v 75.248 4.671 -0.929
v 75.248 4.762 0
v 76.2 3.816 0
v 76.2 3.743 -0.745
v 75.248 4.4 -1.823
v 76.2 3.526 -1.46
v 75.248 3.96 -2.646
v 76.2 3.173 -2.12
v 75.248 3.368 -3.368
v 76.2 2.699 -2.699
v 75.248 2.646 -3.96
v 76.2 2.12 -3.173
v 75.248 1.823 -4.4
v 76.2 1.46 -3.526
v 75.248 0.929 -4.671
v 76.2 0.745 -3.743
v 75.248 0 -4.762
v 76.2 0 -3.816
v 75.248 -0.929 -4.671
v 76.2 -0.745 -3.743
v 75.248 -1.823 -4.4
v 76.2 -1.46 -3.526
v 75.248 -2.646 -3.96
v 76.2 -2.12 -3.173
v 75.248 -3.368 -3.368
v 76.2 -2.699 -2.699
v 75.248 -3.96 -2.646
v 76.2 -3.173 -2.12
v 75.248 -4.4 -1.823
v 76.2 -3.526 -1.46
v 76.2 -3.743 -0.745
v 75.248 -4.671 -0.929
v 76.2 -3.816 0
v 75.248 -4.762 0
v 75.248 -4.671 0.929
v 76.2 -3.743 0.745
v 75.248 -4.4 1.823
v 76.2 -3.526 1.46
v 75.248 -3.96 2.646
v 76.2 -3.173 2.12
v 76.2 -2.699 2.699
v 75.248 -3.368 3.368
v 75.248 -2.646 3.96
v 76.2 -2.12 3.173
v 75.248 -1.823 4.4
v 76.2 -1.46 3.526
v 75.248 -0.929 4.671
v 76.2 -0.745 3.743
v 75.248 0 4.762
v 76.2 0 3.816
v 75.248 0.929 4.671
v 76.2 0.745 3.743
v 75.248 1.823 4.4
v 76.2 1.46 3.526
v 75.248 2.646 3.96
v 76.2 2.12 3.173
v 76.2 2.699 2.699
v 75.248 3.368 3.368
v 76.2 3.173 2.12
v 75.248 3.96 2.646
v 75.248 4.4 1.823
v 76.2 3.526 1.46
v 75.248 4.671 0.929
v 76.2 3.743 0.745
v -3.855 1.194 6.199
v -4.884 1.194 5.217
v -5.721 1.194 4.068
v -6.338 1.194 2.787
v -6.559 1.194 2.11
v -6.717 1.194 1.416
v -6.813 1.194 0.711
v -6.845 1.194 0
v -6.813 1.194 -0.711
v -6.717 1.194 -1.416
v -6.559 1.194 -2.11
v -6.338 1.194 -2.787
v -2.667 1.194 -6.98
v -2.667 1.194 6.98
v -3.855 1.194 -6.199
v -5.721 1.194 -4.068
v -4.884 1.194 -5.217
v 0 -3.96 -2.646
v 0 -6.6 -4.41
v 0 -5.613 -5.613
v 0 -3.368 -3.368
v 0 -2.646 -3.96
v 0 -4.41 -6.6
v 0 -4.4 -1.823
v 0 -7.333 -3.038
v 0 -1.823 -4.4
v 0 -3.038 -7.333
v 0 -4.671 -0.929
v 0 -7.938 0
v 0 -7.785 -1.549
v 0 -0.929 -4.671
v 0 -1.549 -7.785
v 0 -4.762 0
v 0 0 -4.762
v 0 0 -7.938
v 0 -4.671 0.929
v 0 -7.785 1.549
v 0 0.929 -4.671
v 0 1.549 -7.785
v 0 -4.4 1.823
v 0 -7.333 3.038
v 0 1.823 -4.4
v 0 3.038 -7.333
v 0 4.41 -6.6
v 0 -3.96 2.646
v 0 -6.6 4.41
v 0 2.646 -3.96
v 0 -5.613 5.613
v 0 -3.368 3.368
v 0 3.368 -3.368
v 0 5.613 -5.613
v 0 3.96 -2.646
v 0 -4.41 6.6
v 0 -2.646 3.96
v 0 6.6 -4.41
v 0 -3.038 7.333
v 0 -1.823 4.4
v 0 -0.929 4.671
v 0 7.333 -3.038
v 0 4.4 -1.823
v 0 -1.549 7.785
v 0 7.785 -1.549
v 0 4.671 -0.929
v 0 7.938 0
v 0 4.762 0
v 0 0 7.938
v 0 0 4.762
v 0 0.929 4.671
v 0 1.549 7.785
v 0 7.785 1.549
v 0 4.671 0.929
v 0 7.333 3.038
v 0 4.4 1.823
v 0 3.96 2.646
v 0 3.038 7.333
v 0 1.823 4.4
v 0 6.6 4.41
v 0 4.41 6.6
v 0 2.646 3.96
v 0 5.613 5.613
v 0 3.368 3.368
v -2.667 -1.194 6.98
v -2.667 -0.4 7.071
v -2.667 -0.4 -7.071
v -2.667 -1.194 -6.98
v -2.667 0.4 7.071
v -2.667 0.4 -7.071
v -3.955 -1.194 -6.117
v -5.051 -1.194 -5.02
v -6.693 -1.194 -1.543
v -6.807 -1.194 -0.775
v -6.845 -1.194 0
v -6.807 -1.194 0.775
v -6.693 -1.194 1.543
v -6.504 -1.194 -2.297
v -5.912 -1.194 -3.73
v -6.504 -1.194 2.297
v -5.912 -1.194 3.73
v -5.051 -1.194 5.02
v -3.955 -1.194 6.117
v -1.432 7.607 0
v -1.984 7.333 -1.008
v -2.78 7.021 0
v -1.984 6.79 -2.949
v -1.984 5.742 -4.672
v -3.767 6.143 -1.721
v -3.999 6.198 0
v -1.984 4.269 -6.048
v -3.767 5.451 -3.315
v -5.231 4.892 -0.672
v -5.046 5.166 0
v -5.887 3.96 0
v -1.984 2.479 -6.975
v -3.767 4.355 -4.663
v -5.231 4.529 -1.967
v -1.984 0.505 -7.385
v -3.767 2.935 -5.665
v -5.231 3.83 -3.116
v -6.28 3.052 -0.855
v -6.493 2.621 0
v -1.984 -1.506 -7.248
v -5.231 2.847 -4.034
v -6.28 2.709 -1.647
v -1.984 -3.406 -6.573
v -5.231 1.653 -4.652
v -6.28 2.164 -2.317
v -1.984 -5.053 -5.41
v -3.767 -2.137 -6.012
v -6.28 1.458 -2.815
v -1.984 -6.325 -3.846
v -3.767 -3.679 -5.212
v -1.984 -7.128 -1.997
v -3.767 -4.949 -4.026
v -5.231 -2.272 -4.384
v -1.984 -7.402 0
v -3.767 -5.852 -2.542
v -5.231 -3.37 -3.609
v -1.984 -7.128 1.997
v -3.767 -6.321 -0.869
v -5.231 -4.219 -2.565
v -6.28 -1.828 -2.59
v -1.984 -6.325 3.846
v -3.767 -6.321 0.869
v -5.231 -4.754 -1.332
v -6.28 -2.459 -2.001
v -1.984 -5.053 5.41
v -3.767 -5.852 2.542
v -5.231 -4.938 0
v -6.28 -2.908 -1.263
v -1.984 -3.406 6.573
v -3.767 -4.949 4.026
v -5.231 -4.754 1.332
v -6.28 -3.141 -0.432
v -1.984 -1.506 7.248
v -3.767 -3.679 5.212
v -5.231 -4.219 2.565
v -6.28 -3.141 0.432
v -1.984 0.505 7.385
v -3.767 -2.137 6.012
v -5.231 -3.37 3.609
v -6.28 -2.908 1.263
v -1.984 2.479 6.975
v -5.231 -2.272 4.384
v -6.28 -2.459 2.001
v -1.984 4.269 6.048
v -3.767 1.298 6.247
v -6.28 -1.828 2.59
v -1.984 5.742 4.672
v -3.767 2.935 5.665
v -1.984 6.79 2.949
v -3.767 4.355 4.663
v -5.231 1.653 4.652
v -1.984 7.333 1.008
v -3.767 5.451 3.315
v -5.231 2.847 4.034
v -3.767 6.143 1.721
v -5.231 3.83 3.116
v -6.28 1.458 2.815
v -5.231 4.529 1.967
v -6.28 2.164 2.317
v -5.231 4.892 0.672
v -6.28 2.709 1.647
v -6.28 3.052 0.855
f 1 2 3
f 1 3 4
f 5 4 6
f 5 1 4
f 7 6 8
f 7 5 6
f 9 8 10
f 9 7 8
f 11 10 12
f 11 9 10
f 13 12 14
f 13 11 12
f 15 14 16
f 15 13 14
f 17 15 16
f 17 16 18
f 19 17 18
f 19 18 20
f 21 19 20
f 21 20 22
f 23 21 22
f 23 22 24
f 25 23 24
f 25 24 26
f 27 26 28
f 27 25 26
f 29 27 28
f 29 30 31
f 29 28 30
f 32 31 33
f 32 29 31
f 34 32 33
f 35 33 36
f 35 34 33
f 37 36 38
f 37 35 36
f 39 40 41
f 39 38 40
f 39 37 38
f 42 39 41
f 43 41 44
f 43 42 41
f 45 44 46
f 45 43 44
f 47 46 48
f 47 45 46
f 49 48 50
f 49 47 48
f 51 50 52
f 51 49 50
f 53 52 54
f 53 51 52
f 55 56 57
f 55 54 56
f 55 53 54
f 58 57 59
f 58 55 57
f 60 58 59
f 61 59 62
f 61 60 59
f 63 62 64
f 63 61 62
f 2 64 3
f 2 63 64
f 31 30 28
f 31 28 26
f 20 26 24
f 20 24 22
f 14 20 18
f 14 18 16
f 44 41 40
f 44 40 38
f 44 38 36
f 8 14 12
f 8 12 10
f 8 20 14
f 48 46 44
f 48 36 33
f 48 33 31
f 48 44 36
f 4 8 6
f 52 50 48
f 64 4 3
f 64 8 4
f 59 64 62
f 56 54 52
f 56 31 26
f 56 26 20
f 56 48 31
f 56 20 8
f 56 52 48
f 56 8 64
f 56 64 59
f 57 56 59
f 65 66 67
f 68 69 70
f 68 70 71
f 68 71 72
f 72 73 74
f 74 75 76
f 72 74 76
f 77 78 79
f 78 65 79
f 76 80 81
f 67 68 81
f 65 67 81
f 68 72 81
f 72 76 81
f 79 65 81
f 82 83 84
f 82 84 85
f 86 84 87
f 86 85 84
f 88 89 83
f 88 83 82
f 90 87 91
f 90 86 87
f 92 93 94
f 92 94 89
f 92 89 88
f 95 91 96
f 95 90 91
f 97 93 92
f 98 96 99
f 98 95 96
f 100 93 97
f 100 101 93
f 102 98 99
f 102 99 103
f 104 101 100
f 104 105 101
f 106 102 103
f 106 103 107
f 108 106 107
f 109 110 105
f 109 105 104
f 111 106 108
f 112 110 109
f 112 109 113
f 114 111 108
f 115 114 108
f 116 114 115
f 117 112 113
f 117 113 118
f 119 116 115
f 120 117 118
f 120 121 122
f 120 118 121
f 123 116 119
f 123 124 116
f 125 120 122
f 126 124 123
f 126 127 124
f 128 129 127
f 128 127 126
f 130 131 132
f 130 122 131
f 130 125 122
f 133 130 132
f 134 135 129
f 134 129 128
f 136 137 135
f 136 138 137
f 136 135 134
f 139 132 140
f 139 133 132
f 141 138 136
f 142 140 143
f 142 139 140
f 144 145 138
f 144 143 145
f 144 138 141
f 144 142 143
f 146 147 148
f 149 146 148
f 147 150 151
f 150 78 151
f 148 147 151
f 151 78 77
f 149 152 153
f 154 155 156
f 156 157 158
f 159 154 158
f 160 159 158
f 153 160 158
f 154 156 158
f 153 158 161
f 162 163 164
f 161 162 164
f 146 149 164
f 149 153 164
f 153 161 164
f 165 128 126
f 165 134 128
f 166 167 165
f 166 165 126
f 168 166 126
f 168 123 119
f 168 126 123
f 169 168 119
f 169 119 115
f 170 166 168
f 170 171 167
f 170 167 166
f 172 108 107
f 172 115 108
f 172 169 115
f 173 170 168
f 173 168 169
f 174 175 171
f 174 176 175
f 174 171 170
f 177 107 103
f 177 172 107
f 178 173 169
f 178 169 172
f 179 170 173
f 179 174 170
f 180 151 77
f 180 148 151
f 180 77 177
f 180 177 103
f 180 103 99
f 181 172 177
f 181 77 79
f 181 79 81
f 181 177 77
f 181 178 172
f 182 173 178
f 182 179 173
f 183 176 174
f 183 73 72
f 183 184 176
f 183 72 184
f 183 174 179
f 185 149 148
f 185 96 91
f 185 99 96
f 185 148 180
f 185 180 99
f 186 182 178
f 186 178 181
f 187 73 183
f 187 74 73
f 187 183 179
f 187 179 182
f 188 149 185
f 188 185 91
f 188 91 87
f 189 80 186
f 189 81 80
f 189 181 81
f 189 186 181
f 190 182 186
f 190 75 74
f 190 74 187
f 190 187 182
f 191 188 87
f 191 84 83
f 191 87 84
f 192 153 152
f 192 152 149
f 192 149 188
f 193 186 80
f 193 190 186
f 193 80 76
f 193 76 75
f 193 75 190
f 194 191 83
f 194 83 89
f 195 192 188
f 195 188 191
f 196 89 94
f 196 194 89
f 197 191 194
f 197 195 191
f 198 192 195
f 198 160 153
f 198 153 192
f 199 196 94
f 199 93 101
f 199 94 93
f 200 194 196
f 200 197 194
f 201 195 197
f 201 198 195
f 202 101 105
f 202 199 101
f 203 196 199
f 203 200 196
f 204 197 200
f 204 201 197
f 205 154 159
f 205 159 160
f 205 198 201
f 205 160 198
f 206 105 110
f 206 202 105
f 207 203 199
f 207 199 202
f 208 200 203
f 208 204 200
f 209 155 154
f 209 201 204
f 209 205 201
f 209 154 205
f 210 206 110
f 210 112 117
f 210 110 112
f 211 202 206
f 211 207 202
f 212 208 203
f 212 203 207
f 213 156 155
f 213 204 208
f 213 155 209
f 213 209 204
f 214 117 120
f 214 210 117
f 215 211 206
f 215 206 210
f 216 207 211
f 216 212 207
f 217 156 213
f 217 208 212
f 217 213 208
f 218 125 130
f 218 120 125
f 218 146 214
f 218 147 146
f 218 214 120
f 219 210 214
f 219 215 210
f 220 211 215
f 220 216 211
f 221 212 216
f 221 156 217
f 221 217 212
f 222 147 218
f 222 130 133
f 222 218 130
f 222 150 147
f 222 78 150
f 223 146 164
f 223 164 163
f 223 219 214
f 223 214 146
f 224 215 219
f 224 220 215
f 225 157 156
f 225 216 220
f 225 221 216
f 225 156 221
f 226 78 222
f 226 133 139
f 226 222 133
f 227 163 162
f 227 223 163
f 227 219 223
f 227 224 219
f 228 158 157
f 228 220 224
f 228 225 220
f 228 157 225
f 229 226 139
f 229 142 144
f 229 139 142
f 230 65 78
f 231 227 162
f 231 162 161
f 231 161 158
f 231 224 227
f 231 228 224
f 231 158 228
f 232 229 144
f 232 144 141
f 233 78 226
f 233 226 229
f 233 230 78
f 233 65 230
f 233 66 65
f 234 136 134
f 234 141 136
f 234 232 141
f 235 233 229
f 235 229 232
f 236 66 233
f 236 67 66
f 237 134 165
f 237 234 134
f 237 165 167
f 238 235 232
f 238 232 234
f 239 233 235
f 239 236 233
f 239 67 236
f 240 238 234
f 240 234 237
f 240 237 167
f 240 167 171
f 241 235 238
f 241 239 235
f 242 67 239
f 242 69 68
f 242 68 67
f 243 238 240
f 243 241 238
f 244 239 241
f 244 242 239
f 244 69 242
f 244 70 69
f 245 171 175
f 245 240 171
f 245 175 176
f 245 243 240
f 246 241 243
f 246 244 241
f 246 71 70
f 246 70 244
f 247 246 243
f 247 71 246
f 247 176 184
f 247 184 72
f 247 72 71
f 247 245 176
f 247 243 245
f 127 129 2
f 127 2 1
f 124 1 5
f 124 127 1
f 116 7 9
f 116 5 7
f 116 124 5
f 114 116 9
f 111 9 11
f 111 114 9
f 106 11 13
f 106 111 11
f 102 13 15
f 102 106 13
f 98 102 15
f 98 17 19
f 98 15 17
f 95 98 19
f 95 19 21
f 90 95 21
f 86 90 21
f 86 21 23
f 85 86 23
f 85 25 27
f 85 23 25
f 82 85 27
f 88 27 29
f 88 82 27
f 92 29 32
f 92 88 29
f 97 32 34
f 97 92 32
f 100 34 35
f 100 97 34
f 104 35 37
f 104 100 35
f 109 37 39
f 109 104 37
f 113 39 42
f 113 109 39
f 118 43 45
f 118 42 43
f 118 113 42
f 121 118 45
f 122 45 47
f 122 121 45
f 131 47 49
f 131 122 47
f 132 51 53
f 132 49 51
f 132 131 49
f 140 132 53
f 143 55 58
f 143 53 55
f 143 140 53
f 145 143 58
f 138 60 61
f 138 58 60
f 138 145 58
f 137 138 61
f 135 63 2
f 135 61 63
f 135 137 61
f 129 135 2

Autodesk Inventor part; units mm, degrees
ref_plane "YZ Plane" through (0, 0, 0) normal (1, 0, 0) x (0, 1, 0)
sketch "Sketch1" plane through (0, 0, 0) normal (0, 0, 1) x (1, 0, 0)
  line L0 (-6.9342, 0) -> (76.2, 0)
  line L1 (76.2, 0) -> (76.2, 4.7625)
  line L2 (76.2, 4.7625) -> (50.8, 4.7625)
  line L3 (50.8, 4.7625) -> (49.8475, 4.7625)
  line L4 (49.8475, 4.7625) -> (0, 4.7625)
  line L5 (0, 4.7625) -> (0, 7.9375)
  line L6 (-23.561, 0) -> (92.8268, 0) projected
  line L7 (0, -11.1125) -> (0, 11.1125) projected
  line L8 (0, -4.7625) -> (0, -7.9375) construction
  arc A0 (0, 7.9375) -> (0, -7.9375) centre (1.0759, 0) ccw
  line L9 (50.8, 4.7625) -> (0, 4.7625) construction
  dimension "d0" = 76.2
  dimension "d1" = 25.4
  dimension "d2" = 0.9525
  dimension "d3" = 6.9342
  dimension "d4" = 9.525
  dimension "d5" = 9.525
  dimension "d16" = 15.875
revolve "Body" add sketch "Sketch1" angle 360 about axis through (-6.9342, 0, 0) along (1, 0, 0) contours A0 L5 L7 L0 | L7 L4 L3 L2 L1 L0
ref_plane "IDS_WORKPLANE{1}" through (-6.9342, 0, 0) normal (1, 0, 0) x (0, 0, -1)
sketch "Sketch2" plane through (-6.9342, 0, 0) normal (1, 0, 0) x (0, 0, -1)
  line L0 (0, -11.1125) -> (0, 11.1125) projected
  line L1 (11.1125, 0) -> (-11.1125, 0) projected
  line L2 (-7.9375, 1.1938) -> (7.9375, 1.1938)
  line L3 (7.9375, 1.1938) -> (7.9375, -1.1938)
  line L4 (7.9375, -1.1938) -> (-7.9375, -1.1938)
  line L5 (-7.9375, -1.1938) -> (-7.9375, 1.1938)
  line L6 (-7.9375, 0) -> (7.9375, 0) construction
  line L7 (0, 1.1938) -> (0, -1.1938) construction
  circle A0 centre (0, 0) radius 7.9375 projected
  dimension "d18" = 2.3876
extrude "Slot" cut sketch "Sketch2" along normal blind 4.2672 contours L4 A0 L1 L0 | L0 L1 A0 L4 | L4 L5 A0 | A0 L3 L4 | L1 A0 L2 L0 | L0 L2 A0 L1 | L5 L2 A0 | A0 L2 L3
thread "Thread" size "3/8-16 UNC" class "2A" standard "ANSI Unified Screw Threads" length 25.4
chamfer "Chamfer1" distance 0.9462 distance2 0.9525 1 edges at (76.2, -4.7625, 0) measured on face at (76.2, 0.2765, -0.8749)
ref_plane "Work Plane2" through (41.275, 0, 0) normal (0, 0, -1) x (1, 0, 0)
equation "\"d0\" = NLG"
equation "\"d1\" = GEL"
equation "\"d2\" = GAL"
equation "\"d3\" = KOH"
equation "\"d4\" = GD"
equation "\"d5\" = BDM"
equation "\"d16\" = KOD"
equation "\"d18\" = SBR"
equation "\"d19\" = STI"
equation "\"d9\" = GEL"
equation "\"d11\" = -0.5 * SPD + 0.5 * GD"
equation "\"d12\" = GUL"
equation "\"GD\" = NND"
equation "\"NLG\" = 76.2"
equation "\"GEL\" = 25.4"
equation "\"KOD\" = 15.875"
equation "\"KOH\" = 6.9342"
equation "\"GAL\" = 0.9525"
equation "\"SPD\" = GD1"
equation "\"BDM\" = NND"
equation "\"GUL\" = GAL"
equation "\"STI\" = 4.2672"
equation "\"SBR\" = 2.3876"
equation "\"d17\" = -KOH"
equation "\"KR\" = KOH"
equation "\"THREADDIA\" = 9.525"
equation "\"TOA\" = 30deg"
equation "\"RR\" = 0.7874"
equation "\"NND\" = 9.525"
equation "\"GD1\" = 7.6327"
properties part number "ANSI B18.6.2 - 3/8-16 UNC - 3, SRHCSI" material "Steel, Mild"
